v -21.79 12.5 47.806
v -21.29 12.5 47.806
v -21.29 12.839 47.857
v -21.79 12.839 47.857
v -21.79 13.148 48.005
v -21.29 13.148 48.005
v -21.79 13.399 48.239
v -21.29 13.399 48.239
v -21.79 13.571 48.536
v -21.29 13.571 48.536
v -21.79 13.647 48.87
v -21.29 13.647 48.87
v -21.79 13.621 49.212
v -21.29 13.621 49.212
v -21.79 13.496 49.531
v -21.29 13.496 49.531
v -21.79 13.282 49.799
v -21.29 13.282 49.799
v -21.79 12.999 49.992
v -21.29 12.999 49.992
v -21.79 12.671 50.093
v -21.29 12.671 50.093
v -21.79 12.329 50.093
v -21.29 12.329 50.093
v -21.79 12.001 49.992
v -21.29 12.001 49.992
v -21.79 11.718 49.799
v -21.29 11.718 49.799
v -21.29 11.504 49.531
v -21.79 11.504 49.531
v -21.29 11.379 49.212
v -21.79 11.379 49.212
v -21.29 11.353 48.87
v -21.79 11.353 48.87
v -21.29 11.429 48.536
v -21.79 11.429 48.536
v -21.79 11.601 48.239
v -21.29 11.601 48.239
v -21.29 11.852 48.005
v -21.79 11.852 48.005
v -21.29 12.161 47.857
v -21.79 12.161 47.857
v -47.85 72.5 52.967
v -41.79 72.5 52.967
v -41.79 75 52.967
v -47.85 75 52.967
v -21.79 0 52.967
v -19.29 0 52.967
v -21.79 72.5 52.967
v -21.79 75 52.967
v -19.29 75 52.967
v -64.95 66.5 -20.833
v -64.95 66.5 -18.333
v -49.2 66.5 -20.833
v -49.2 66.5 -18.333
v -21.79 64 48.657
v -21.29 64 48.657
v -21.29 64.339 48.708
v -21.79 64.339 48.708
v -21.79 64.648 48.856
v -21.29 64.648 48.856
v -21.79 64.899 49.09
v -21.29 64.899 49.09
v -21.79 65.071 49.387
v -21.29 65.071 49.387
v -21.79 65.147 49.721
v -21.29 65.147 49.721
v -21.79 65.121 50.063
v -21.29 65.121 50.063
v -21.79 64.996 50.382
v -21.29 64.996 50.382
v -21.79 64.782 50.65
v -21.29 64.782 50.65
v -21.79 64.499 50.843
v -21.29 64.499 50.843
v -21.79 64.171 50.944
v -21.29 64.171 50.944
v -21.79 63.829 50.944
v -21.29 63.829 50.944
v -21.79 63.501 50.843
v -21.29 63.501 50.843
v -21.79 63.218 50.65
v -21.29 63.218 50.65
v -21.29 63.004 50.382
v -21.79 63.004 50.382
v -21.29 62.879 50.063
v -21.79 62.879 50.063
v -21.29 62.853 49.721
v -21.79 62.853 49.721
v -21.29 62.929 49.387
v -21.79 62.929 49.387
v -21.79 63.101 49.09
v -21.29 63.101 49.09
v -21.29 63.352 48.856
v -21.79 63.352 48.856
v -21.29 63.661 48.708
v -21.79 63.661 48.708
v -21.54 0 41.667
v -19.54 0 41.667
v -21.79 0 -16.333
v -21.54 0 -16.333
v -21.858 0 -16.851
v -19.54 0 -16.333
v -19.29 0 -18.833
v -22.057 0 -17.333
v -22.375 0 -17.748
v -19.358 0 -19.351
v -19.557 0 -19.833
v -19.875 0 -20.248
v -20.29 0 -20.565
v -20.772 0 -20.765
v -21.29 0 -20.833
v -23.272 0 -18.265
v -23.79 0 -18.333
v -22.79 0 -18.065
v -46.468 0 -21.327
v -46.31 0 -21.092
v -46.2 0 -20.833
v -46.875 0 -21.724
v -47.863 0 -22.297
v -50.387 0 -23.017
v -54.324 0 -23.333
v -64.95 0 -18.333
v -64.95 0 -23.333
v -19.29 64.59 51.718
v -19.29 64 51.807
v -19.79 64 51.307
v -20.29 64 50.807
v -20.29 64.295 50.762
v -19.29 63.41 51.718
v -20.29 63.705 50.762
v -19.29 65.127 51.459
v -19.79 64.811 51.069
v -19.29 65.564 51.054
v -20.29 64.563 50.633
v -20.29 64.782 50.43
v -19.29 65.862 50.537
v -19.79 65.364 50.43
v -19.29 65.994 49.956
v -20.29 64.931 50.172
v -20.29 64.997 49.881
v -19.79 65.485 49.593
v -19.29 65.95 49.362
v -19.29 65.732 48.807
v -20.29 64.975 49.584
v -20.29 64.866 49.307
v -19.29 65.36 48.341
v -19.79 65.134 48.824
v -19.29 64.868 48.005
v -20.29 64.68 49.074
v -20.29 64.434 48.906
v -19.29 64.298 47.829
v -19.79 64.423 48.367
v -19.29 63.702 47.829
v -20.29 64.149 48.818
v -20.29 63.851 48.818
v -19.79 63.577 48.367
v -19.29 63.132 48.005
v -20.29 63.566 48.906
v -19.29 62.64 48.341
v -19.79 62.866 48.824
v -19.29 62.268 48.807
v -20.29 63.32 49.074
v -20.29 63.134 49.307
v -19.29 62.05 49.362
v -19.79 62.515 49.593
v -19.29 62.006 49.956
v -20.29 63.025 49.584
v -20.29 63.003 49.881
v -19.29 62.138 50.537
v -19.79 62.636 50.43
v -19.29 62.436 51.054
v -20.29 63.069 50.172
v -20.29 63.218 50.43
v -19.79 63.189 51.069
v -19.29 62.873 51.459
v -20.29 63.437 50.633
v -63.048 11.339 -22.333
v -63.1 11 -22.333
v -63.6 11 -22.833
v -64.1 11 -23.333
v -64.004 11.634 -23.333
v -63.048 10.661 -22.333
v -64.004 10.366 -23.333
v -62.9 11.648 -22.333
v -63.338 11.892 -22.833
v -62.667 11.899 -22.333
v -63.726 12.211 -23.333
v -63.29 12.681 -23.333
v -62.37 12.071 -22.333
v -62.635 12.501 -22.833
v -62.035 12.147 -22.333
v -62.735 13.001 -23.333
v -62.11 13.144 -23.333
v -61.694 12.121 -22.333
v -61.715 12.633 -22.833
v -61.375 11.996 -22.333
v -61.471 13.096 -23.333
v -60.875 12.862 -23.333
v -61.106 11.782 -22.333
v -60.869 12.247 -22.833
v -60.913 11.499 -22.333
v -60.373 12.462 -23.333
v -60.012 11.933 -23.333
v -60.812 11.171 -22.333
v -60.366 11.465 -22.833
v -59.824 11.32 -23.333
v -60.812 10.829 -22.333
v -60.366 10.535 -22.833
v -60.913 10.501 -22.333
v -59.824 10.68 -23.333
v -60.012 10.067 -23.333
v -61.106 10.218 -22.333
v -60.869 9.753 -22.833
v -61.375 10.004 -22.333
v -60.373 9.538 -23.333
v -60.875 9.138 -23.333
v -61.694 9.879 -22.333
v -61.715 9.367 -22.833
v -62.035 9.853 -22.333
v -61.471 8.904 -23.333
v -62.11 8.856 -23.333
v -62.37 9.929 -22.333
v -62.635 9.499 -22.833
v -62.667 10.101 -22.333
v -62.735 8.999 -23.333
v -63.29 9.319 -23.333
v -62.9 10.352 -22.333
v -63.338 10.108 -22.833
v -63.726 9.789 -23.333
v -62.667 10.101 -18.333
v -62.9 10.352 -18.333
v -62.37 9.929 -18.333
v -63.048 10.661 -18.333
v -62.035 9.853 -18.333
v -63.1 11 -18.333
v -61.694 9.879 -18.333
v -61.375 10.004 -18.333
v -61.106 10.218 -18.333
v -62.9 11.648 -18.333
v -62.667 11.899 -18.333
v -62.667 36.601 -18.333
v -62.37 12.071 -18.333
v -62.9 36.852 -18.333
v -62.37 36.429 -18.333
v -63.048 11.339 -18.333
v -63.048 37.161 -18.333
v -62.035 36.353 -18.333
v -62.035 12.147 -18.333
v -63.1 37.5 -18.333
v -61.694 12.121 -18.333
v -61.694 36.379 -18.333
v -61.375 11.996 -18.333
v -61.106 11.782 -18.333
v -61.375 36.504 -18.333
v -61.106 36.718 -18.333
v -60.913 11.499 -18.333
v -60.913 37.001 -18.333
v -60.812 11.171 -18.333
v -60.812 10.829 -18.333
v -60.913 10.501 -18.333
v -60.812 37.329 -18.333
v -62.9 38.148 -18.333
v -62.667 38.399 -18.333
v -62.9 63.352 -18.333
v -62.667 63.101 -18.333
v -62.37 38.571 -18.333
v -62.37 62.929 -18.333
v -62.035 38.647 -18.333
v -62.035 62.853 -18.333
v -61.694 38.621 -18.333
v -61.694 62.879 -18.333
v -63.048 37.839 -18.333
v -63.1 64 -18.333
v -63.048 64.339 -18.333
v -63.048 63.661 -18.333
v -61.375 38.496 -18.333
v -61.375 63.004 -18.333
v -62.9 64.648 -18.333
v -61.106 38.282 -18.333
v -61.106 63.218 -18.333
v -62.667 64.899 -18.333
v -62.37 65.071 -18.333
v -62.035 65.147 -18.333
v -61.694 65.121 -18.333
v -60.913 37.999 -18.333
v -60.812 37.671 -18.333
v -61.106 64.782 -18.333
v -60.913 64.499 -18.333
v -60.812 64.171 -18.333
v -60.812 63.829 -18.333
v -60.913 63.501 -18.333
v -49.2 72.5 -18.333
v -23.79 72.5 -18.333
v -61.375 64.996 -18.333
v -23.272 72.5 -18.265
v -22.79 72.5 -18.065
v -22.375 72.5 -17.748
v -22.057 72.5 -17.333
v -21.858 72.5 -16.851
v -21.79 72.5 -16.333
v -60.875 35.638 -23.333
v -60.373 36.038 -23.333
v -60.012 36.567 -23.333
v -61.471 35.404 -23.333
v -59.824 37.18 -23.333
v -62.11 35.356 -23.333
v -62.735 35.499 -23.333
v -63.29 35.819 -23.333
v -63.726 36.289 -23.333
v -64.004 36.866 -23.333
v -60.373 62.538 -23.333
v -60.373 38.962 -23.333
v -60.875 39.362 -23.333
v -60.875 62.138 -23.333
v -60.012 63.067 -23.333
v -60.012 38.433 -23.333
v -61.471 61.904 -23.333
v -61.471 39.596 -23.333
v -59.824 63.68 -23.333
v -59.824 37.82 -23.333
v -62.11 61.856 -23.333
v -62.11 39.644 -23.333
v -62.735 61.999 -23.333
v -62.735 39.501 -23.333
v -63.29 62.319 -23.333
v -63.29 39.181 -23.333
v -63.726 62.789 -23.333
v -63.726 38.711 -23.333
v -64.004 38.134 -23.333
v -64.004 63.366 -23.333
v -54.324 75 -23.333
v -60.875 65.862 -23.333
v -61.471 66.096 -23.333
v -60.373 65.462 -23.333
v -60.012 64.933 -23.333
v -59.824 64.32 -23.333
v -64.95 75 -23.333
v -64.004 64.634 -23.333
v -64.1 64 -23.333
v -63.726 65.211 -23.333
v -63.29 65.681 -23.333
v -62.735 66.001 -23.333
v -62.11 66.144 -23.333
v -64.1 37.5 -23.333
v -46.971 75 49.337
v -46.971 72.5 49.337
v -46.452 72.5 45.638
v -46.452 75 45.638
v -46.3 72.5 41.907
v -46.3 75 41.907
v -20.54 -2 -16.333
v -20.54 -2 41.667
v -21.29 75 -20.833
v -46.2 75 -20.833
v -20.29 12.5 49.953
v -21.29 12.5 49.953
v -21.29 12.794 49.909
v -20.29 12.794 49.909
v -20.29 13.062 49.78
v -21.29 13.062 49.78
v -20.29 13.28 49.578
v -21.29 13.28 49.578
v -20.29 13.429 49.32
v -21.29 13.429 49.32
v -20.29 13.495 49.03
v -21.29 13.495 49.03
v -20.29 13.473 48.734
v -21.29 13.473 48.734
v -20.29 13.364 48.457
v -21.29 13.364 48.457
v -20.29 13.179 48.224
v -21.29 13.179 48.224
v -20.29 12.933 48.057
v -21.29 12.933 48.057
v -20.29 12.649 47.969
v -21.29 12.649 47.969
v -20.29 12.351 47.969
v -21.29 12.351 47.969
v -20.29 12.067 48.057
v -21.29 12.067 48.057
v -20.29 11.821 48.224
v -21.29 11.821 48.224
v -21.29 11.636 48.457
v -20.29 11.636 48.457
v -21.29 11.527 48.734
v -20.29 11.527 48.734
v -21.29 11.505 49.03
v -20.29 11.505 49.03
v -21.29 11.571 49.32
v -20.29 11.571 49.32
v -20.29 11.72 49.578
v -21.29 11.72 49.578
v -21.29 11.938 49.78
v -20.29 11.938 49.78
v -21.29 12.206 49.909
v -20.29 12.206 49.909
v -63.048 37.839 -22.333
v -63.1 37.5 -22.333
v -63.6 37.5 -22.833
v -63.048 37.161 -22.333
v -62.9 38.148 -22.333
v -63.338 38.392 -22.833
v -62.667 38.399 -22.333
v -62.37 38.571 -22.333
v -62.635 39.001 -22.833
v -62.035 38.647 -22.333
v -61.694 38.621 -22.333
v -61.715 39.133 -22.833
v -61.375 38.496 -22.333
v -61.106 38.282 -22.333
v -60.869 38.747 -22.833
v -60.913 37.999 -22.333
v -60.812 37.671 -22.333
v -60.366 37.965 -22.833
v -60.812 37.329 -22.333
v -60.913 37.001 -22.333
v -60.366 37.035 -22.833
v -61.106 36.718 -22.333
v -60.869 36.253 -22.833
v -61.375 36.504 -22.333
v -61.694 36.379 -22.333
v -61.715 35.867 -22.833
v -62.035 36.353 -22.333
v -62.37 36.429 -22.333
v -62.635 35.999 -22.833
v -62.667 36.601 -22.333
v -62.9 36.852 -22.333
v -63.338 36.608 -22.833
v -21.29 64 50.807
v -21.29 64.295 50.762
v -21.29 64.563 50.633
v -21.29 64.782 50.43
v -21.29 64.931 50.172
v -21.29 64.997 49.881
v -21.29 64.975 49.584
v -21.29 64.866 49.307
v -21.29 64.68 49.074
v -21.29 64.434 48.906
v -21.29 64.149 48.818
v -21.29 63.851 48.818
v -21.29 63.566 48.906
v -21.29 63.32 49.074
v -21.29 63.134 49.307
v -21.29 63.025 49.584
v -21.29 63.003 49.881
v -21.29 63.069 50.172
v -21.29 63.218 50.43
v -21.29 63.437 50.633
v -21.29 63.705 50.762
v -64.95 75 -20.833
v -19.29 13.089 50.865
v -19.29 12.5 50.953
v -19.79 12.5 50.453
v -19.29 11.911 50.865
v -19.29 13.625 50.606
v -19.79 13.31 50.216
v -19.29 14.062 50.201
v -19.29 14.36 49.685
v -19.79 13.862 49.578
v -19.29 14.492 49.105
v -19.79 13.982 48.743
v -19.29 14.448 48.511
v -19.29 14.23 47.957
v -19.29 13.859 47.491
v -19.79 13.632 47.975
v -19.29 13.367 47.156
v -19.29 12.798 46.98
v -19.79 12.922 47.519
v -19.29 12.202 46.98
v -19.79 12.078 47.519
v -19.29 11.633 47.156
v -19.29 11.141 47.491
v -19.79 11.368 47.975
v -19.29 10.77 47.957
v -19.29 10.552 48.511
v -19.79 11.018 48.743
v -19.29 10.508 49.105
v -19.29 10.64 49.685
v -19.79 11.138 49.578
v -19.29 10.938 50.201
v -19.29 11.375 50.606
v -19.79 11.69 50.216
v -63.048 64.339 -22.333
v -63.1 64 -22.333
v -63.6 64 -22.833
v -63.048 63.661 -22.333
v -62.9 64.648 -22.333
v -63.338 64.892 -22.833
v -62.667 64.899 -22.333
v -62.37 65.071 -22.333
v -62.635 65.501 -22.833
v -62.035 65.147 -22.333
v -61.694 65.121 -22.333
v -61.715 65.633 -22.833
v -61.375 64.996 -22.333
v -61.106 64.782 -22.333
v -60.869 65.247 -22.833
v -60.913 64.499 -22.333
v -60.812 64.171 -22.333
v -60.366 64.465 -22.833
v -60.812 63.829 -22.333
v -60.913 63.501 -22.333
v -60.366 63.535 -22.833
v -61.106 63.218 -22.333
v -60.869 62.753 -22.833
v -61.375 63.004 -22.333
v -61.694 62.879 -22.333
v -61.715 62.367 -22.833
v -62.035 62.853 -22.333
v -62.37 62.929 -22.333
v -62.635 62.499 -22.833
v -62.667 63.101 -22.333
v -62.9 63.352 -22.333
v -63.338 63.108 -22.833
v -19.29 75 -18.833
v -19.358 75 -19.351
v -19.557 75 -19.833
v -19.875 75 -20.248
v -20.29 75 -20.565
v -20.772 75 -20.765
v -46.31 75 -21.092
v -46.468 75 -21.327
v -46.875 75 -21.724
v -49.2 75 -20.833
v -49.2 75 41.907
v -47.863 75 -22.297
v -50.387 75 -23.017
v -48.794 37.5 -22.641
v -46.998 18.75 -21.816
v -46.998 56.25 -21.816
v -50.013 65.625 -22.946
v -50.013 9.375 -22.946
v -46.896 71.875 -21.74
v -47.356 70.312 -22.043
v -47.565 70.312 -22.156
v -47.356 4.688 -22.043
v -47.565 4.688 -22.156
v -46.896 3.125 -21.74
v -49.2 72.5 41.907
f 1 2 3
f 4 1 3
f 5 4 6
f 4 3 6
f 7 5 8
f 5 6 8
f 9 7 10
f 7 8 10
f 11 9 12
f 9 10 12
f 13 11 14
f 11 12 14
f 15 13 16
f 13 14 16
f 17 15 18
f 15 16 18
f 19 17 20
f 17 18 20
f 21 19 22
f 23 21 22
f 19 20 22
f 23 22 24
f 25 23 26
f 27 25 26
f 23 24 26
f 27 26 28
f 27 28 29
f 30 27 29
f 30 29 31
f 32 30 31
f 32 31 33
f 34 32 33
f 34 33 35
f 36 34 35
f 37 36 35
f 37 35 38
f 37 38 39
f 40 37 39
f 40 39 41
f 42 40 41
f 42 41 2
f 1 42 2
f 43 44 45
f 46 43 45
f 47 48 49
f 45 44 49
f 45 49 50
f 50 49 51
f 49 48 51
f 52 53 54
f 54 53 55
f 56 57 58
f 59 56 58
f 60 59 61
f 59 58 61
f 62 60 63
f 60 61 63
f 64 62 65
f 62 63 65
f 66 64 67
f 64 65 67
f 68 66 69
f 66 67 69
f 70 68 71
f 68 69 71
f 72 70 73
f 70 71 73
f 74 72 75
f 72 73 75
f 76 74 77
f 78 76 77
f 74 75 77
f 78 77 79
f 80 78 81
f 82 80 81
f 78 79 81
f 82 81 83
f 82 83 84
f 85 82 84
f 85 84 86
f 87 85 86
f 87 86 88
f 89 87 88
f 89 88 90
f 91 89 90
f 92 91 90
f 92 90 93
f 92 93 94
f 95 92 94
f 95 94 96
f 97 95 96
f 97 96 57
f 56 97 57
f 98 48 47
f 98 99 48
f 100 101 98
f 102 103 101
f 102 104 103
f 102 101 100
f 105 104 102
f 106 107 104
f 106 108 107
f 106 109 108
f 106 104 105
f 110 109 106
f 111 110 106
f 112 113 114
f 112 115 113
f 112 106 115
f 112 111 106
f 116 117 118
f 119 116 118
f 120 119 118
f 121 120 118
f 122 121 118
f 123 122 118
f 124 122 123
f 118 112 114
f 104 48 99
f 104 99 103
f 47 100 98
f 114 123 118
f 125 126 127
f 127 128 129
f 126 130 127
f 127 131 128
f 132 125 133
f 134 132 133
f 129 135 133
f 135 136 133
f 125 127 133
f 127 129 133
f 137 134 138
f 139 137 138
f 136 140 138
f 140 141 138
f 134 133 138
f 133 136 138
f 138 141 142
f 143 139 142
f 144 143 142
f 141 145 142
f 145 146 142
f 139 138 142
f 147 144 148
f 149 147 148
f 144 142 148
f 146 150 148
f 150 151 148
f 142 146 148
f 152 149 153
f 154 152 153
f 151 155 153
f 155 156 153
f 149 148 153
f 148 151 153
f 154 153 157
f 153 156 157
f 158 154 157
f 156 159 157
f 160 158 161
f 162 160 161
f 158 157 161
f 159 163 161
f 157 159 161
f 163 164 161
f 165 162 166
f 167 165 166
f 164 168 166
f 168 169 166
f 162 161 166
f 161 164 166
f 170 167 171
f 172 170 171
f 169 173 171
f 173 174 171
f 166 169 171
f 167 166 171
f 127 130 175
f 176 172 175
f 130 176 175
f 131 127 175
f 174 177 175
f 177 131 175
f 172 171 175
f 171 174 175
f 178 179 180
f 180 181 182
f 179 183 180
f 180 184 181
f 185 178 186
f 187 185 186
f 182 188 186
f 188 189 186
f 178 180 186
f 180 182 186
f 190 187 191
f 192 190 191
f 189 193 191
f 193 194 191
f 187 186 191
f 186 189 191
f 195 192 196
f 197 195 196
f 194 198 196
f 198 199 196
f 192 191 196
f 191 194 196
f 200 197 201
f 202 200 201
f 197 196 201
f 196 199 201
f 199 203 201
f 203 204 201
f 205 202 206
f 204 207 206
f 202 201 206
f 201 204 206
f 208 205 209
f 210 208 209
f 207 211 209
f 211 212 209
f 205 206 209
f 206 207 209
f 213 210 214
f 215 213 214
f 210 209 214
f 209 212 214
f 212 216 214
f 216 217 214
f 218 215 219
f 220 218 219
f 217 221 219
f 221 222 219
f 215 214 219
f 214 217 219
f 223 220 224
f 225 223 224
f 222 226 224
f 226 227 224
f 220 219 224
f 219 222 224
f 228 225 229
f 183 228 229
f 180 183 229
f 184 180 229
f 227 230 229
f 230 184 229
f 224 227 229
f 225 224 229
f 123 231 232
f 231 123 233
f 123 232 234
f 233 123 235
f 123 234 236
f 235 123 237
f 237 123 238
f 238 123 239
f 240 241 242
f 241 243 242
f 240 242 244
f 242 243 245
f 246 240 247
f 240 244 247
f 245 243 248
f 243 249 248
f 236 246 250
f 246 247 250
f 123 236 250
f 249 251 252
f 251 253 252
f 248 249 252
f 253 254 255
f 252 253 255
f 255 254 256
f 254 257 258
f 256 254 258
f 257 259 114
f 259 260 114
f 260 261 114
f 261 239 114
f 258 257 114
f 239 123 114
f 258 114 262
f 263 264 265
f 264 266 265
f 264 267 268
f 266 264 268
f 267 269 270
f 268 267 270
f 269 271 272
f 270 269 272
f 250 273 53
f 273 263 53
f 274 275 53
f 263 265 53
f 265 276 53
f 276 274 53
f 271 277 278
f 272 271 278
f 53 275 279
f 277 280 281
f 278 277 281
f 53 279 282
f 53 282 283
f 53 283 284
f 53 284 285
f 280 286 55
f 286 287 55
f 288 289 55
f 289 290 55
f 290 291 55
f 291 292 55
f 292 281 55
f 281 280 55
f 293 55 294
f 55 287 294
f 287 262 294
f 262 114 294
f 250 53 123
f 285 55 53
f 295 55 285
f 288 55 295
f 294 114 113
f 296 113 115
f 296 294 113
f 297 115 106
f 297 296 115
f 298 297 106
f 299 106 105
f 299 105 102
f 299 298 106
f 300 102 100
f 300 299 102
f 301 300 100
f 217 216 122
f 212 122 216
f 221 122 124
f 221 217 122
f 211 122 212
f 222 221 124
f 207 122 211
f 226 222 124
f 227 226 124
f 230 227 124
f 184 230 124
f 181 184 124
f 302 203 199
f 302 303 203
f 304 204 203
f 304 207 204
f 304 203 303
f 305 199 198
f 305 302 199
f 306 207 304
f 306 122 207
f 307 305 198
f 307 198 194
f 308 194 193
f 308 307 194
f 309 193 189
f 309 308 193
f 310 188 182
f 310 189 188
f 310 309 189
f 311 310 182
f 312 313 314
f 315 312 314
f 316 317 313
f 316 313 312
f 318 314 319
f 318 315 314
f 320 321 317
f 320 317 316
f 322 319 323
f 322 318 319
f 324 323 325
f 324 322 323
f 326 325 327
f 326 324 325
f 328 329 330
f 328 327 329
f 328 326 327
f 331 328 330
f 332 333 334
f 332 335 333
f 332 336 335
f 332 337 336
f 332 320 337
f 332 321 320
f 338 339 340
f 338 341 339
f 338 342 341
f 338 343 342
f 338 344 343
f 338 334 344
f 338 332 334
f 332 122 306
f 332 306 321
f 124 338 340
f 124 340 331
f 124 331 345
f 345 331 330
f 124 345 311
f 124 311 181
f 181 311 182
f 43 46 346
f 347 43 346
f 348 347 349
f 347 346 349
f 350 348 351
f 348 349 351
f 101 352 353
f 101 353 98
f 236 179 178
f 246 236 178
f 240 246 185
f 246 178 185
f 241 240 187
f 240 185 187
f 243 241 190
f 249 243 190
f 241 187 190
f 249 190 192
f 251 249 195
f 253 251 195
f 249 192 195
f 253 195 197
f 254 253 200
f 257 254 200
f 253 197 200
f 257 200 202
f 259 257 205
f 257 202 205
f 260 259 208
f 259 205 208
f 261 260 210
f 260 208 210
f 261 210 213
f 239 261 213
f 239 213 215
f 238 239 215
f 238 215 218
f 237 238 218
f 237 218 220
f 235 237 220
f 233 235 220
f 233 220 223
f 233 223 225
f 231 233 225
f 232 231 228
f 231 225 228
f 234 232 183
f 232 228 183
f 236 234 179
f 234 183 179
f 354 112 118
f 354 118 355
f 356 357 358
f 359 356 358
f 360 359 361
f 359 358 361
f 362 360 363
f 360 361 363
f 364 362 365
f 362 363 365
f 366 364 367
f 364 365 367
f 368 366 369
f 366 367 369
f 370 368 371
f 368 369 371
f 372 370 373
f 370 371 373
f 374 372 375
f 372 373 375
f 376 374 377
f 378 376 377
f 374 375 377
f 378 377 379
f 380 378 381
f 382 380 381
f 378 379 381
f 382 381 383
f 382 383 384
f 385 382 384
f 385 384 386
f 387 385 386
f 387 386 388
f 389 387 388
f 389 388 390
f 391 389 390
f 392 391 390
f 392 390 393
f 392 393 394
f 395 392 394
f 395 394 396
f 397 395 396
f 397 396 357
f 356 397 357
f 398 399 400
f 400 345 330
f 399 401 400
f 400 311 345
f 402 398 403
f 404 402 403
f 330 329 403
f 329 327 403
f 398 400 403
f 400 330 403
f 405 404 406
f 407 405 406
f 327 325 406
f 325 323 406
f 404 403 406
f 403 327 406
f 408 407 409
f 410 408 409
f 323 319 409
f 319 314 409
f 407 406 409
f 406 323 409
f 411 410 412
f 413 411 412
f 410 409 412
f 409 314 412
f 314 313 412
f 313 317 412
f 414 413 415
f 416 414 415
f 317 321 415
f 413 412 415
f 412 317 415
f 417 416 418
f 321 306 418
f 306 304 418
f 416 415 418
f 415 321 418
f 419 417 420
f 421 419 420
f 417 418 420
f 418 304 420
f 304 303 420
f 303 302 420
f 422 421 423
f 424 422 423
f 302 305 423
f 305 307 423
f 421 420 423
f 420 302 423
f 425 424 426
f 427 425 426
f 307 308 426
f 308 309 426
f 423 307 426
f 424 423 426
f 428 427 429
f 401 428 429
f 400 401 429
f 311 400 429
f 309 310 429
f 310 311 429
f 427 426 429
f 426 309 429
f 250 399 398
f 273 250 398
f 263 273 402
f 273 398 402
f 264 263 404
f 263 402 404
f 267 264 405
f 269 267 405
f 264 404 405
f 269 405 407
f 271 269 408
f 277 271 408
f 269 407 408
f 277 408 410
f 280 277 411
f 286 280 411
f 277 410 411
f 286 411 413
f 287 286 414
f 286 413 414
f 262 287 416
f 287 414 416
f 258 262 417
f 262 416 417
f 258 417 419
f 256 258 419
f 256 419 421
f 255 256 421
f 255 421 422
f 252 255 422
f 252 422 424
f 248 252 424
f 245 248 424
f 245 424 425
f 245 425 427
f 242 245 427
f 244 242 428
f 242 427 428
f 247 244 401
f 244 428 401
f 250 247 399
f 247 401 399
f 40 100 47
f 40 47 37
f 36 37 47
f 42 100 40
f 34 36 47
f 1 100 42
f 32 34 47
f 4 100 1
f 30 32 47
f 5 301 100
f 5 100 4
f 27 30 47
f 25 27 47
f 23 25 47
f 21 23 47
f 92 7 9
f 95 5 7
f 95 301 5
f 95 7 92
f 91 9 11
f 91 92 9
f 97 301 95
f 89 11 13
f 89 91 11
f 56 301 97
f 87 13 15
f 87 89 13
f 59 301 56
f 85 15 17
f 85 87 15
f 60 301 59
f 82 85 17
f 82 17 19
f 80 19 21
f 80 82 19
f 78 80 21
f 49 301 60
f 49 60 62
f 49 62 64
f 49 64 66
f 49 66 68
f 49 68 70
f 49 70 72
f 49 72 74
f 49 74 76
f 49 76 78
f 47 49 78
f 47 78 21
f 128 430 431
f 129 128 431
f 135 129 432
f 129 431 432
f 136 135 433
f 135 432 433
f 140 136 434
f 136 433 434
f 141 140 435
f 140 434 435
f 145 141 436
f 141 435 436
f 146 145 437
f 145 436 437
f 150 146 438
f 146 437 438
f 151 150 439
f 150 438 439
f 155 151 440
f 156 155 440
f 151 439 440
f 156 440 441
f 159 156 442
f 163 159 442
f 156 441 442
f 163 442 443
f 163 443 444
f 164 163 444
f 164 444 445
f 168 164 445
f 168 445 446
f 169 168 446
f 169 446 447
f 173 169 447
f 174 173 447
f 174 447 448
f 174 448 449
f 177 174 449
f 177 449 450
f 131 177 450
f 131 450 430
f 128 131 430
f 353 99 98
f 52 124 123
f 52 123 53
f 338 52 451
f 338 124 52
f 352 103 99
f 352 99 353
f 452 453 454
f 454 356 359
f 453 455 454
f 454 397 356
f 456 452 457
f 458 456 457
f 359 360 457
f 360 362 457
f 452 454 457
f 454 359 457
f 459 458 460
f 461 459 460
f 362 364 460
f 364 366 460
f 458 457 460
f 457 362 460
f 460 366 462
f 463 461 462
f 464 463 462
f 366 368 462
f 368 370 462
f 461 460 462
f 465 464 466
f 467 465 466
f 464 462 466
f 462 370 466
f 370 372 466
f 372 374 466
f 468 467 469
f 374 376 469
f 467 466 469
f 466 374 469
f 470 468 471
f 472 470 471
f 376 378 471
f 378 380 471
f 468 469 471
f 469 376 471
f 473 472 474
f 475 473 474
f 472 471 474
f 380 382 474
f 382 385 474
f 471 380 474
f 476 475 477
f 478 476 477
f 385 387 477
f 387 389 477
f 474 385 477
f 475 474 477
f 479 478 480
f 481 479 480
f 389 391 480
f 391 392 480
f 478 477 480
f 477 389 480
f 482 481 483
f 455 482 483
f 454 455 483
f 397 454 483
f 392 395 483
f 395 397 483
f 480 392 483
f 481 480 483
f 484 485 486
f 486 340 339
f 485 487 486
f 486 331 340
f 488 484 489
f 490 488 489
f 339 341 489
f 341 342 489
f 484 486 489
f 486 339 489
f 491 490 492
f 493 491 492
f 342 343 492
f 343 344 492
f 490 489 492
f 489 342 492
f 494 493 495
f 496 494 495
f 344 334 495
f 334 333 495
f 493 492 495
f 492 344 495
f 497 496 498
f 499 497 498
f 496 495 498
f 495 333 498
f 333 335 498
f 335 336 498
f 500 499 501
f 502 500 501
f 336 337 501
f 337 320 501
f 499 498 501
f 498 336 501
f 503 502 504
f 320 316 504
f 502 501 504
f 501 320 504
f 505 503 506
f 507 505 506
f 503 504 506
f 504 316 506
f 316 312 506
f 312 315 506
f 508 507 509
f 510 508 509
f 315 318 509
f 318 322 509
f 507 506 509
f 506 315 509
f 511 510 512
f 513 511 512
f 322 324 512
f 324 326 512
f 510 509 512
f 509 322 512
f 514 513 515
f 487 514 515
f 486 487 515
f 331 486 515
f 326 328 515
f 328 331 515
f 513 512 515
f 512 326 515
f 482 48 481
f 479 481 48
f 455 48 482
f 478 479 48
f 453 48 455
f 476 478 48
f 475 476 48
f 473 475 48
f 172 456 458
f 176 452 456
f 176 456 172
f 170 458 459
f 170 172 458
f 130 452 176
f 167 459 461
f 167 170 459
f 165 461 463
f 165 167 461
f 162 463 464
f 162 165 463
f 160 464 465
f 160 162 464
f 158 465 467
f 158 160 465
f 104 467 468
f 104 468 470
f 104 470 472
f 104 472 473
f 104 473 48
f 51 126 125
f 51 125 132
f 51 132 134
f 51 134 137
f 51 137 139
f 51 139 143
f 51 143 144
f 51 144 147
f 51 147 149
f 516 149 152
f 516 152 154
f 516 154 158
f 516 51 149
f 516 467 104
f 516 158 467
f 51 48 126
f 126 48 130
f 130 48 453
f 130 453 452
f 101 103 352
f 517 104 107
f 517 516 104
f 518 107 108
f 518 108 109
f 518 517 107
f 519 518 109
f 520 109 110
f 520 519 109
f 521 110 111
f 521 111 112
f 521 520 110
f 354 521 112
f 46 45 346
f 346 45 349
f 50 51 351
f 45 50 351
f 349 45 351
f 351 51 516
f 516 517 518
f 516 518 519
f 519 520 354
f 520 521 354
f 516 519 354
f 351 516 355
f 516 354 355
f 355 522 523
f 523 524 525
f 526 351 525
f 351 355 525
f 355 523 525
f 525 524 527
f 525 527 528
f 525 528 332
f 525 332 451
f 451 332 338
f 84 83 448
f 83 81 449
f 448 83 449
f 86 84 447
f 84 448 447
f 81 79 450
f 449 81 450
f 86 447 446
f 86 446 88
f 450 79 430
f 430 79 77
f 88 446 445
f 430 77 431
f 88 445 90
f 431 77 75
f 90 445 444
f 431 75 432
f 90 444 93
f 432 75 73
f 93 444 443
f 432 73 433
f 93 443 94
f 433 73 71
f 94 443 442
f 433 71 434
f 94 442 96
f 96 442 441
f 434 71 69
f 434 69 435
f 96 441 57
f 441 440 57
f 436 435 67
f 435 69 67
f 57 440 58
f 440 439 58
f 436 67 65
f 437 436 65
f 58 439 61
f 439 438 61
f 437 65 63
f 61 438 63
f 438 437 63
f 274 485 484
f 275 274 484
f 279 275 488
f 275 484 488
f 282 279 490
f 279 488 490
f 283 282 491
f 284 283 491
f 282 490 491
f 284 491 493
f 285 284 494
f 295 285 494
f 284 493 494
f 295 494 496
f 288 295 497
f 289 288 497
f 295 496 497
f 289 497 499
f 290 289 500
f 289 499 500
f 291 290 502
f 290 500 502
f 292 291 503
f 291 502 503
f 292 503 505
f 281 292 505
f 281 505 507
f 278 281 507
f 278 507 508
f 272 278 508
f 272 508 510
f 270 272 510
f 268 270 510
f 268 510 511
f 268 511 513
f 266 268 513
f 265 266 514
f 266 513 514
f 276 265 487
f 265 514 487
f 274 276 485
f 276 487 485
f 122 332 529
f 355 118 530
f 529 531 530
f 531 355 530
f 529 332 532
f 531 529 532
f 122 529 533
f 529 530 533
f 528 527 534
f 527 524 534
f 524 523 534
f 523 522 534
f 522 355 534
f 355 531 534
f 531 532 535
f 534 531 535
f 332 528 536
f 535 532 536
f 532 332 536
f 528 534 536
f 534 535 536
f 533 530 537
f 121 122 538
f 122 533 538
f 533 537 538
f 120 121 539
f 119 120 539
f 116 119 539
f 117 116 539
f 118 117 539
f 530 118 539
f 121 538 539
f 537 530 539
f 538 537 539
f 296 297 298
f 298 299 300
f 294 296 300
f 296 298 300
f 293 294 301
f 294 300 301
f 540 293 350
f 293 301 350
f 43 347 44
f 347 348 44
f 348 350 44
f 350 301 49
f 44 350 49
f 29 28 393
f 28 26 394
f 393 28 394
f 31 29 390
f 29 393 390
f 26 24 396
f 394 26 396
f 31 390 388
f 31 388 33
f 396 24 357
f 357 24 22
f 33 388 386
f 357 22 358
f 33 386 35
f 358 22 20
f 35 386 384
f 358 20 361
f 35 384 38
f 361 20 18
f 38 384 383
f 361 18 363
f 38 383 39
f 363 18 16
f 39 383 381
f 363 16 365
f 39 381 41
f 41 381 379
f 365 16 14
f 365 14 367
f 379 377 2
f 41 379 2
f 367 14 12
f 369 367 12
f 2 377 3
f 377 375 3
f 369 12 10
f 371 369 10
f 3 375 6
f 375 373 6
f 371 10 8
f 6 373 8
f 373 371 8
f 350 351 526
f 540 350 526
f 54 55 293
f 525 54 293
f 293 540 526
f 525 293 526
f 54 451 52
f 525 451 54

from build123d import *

# Parameters (mm, degrees)
BOSS_EXTRUDE1_DEPTH = 75
FILLET1_R           = 2
SKETCH4_R           = 1.15
CUT_EXTRUDE2_DEPTH  = 5
BOSS_EXTRUDE2_DEPTH = 58
SKETCH7_W           = 12
SKETCH7_H           = 80
CUT_EXTRUDE3_DEPTH  = 5
SKETCH8_W           = 2.5
SKETCH8_H           = 75
BOSS_EXTRUDE3_DEPTH = 20
SKETCH10_W          = 71.647703853
SKETCH10_H          = 2.5
BOSS_EXTRUDE4_DEPTH = 20
SKETCH12_W          = 3.098039447
SKETCH12_H          = 2.1077236
CUT_EXTRUDE4_DEPTH  = 58
SKETCH13_W          = 11.16
SKETCH13_H          = 75
BOSS_EXTRUDE6_DEPTH = 2
SKETCH14_R          = 1
SKETCH14_R_2        = 0.99762978
CUT_EXTRUDE5_DEPTH  = 10
CHAMFER2_SIZE       = 1
SKETCH16_W          = 2.5
SKETCH16_H          = 75
BOSS_EXTRUDE7_DEPTH = 10
SKETCH17_W          = 71.3
SKETCH17_H          = 2.5
BOSS_EXTRUDE8_DEPTH = 10
SKETCH18_R          = 1.15
CUT_EXTRUDE7_DEPTH  = 4
CUT_EXTRUDE8_DEPTH  = 10
BOSS_EXTRUDE9_START = 2.5
SKETCH21_W          = 18.75
SKETCH21_H          = 75
SKETCH21_R          = 1.15
BOSS_EXTRUDE9_DEPTH = 2.5
CUT_EXTRUDE10_DEPTH = 2.5
CHAMFER3_SIZE       = 1
FILLET2_START       = -1
FILLET2_DEPTH       = 77


with BuildPart() as part:
    # Sketch1 → Boss-Extrude1 (new body)
    with BuildSketch(Plane(origin=(0, 0, 0), x_dir=(1, 0, 0), z_dir=(0, 1, 0))):
        with BuildLine():
            Line((-23.765673143, -52.966666667), (-21.11640892, -52.966666667))
            ThreePointArc((-21.11640892, -52.966666667), (-19.749251579, -47.460938782), (-19.289506454, -41.806666667))
            Line((-19.289506454, -41.806666667), (-19.289506454, 18.333333333))
            Line((-19.289506454, 18.333333333), (-19.289506454, 20.833333333))
            Line((-19.289506454, 20.833333333), (-34.949506454, 20.833333333))
            Line((-34.949506454, 20.833333333), (-34.949506454, 18.333333333))
            Line((-34.949506454, 18.333333333), (-21.789506454, 18.333333333))
            Line((-21.789506454, 18.333333333), (-21.789506454, -41.806666667))
            ThreePointArc((-21.789506454, -41.806666667), (-22.287361349, -47.473474295), (-23.765673143, -52.966666667))
        make_face()
    extrude(amount=BOSS_EXTRUDE1_DEPTH)

    # Fillet1
    fillet1_edges = [part.edges().sort_by_distance(p)[0] for p in [
        (-21.789506454, 37.5, -18.333333333),
        (-19.289506454, 37.5, -20.833333333),
    ]]
    fillet(fillet1_edges, radius=FILLET1_R)

    # Sketch4 → Cut-Extrude2 (cut)
    with BuildSketch(Plane(origin=(-19.289506454, 0, 0), x_dir=(0, 0, -1), z_dir=(1, 0, 0))):
        with Locations((-49.806666667, 64)):
            Circle(SKETCH4_R)
        with Locations((-48.955669454, 12.5)):
            Circle(SKETCH4_R)
    extrude(amount=-CUT_EXTRUDE2_DEPTH, mode=Mode.SUBTRACT)

    # Sketch6 → Boss-Extrude2 (add)
    with BuildSketch(Plane(origin=(0, 0, -16.333333333), x_dir=(-1, 0, 0), z_dir=(0, 0, -1))):
        Polygon((19.539506454, 75), (21.539506454, 75), (20.48442105, 77), align=None)
        Polygon((21.539506454, 0), (19.539506454, 0), (20.539506454, -2), align=None)
    extrude(amount=-BOSS_EXTRUDE2_DEPTH)

    # Sketch7 → Cut-Extrude3 (cut)
    with BuildSketch(Plane.ZY.offset(21.789506454)):
        with Locations((47.806666667, 35)):
            Rectangle(SKETCH7_W, SKETCH7_H)
    extrude(amount=CUT_EXTRUDE3_DEPTH, mode=Mode.SUBTRACT)

    # Sketch8 → Boss-Extrude3 (add)
    with BuildSketch(Plane.ZY.offset(34.949506454)):
        with Locations((-19.583333333, 37.5)):
            Rectangle(SKETCH8_W, SKETCH8_H)
    extrude(amount=BOSS_EXTRUDE3_DEPTH)

    # Sketch10 → Boss-Extrude4 (add)
    with BuildSketch(Plane.ZY.offset(21.789506454)):
        with Locations((17.142814741, 73.75)):
            Rectangle(SKETCH10_W, SKETCH10_H)
    extrude(amount=BOSS_EXTRUDE4_DEPTH)

    # Sketch12 → Cut-Extrude4 (cut)
    with BuildSketch(Plane(origin=(0, 0, -16.333333333), x_dir=(-1, 0, 0), z_dir=(0, 0, -1))):
        with Locations((20.374958132, 76.0538618)):
            Rectangle(SKETCH12_W, SKETCH12_H)
    extrude(amount=-CUT_EXTRUDE4_DEPTH, mode=Mode.SUBTRACT)

    # Sketch13 → Boss-Extrude6 (add)
    with BuildSketch(Plane(origin=(-19.289506454, 0, 0), x_dir=(0, 0, -1), z_dir=(1, 0, 0))):
        with Locations((-47.386666667, 37.5)):
            Rectangle(SKETCH13_W, SKETCH13_H)
    extrude(amount=-BOSS_EXTRUDE6_DEPTH)

    # Sketch14 → Cut-Extrude5 (cut)
    with BuildSketch(Plane.ZY.offset(21.289506454)):
        with Locations((49.806666667, 64)):
            Circle(SKETCH14_R)
        with Locations((48.955669454, 12.5)):
            Circle(SKETCH14_R_2)
    extrude(amount=-CUT_EXTRUDE5_DEPTH, mode=Mode.SUBTRACT)

    # Chamfer2
    chamfer2_edges = [part.edges().sort_by_distance(p)[0] for p in [
        (-19.289506454, 64, 48.806666667),
        (-19.289506454, 12.5, 47.958039674),
    ]]
    chamfer(chamfer2_edges, length=CHAMFER2_SIZE)

    # Sketch16 → Boss-Extrude7 (add)
    with BuildSketch(Plane.ZY.offset(54.949506454)):
        with Locations((-19.583333333, 37.5)):
            Rectangle(SKETCH16_W, SKETCH16_H)
    extrude(amount=BOSS_EXTRUDE7_DEPTH)

    # Sketch17 → Boss-Extrude8 (add)
    with BuildSketch(Plane.ZY.offset(41.789506454)):
        with Locations((17.316666667, 73.75)):
            Rectangle(SKETCH17_W, SKETCH17_H)
    extrude(amount=BOSS_EXTRUDE8_DEPTH)

    # Sketch18 → Cut-Extrude7 (cut)
    with BuildSketch(Plane(origin=(0, 0, -20.833333333), x_dir=(-1, 0, 0), z_dir=(0, 0, -1))):
        with Locations((61.949506454, 64)):
            Circle(SKETCH18_R)
        with Locations((61.949506454, 37.5)):
            Circle(SKETCH18_R)
        with Locations((61.949506454, 11)):
            Circle(SKETCH18_R)
    extrude(amount=-CUT_EXTRUDE7_DEPTH, mode=Mode.SUBTRACT)

    # Sketch20 → Cut-Extrude8 (cut)
    with BuildSketch(Plane(origin=(0, 75, 0), x_dir=(1, 0, 0), z_dir=(0, 1, 0))):
        with BuildLine():
            Line((-46.299506454, -41.906666667), (-49.199506454, -41.906666667))
            Line((-49.199506454, -41.906666667), (-49.199506454, 18.333333333))
            Line((-49.199506454, 18.333333333), (-51.789506454, 18.333333333))
            Line((-51.789506454, 18.333333333), (-51.789506454, -52.966666667))
            Line((-51.789506454, -52.966666667), (-47.849506454, -52.966666667))
            ThreePointArc((-47.849506454, -52.966666667), (-46.665976454, -47.493919967), (-46.299506454, -41.906666667))
        make_face()
    extrude(amount=-CUT_EXTRUDE8_DEPTH, mode=Mode.SUBTRACT)

    # Sketch21 → Boss-Extrude9 (add)
    with BuildSketch(Plane(origin=(0, 0, -20.833333333), x_dir=(-1, 0, 0), z_dir=(0, 0, -1)).offset(BOSS_EXTRUDE9_START)):
        with Locations((55.574506454, 37.5)):
            Rectangle(SKETCH21_W, SKETCH21_H)
        with Locations((61.949506454, 11)):
            Circle(SKETCH21_R, mode=Mode.SUBTRACT)
        with Locations((61.949506454, 37.5)):
            Circle(SKETCH21_R, mode=Mode.SUBTRACT)
        with Locations((61.949506454, 64)):
            Circle(SKETCH21_R, mode=Mode.SUBTRACT)
    extrude(amount=-BOSS_EXTRUDE9_DEPTH)

    # Sketch22 → Cut-Extrude10 (cut)
    with BuildSketch(Plane.XY.offset(-18.333333333)):
        Polygon((-49.199506454, 66.5), (-49.199506454, 72.5), (-49.199506454, 75), (-64.949506454, 75), (-64.949506454, 66.5), align=None)
    extrude(amount=-CUT_EXTRUDE10_DEPTH, mode=Mode.SUBTRACT)

    # Chamfer3
    chamfer3_edges = [part.edges().sort_by_distance(p)[0] for p in [
        (-60.799506454, 37.5, -23.333333333),
        (-60.799506454, 11, -23.333333333),
        (-60.799506454, 64, -23.333333333),
    ]]
    chamfer(chamfer3_edges, length=CHAMFER3_SIZE)

    # Fillet2: read off the stored shape, not the designer's step
    # Fillet2 outline → Fillet2 (cut)
    with BuildSketch(Plane(origin=(0, 0, 0), x_dir=(1, 0, 0), z_dir=(0, 1, 0)).offset(FILLET2_START)):
        with BuildLine():
            add(Edge.make_bspline(
                [(-46.199506454, 20.833333333), (-46.968828273, 23.333333333), (-54.323544859, 23.333333333)],
                knots=[0, 0, 0, 1, 1, 1], degree=2, weights=[1, 0.804399667, 1]))
            Line((-46.199506454, 20.833333333), (-46.199506454, 23.333333333))
            Line((-46.199506454, 23.333333333), (-54.323544859, 23.333333333))
        make_face()
    extrude(amount=FILLET2_DEPTH, mode=Mode.SUBTRACT)


solid = part.part
